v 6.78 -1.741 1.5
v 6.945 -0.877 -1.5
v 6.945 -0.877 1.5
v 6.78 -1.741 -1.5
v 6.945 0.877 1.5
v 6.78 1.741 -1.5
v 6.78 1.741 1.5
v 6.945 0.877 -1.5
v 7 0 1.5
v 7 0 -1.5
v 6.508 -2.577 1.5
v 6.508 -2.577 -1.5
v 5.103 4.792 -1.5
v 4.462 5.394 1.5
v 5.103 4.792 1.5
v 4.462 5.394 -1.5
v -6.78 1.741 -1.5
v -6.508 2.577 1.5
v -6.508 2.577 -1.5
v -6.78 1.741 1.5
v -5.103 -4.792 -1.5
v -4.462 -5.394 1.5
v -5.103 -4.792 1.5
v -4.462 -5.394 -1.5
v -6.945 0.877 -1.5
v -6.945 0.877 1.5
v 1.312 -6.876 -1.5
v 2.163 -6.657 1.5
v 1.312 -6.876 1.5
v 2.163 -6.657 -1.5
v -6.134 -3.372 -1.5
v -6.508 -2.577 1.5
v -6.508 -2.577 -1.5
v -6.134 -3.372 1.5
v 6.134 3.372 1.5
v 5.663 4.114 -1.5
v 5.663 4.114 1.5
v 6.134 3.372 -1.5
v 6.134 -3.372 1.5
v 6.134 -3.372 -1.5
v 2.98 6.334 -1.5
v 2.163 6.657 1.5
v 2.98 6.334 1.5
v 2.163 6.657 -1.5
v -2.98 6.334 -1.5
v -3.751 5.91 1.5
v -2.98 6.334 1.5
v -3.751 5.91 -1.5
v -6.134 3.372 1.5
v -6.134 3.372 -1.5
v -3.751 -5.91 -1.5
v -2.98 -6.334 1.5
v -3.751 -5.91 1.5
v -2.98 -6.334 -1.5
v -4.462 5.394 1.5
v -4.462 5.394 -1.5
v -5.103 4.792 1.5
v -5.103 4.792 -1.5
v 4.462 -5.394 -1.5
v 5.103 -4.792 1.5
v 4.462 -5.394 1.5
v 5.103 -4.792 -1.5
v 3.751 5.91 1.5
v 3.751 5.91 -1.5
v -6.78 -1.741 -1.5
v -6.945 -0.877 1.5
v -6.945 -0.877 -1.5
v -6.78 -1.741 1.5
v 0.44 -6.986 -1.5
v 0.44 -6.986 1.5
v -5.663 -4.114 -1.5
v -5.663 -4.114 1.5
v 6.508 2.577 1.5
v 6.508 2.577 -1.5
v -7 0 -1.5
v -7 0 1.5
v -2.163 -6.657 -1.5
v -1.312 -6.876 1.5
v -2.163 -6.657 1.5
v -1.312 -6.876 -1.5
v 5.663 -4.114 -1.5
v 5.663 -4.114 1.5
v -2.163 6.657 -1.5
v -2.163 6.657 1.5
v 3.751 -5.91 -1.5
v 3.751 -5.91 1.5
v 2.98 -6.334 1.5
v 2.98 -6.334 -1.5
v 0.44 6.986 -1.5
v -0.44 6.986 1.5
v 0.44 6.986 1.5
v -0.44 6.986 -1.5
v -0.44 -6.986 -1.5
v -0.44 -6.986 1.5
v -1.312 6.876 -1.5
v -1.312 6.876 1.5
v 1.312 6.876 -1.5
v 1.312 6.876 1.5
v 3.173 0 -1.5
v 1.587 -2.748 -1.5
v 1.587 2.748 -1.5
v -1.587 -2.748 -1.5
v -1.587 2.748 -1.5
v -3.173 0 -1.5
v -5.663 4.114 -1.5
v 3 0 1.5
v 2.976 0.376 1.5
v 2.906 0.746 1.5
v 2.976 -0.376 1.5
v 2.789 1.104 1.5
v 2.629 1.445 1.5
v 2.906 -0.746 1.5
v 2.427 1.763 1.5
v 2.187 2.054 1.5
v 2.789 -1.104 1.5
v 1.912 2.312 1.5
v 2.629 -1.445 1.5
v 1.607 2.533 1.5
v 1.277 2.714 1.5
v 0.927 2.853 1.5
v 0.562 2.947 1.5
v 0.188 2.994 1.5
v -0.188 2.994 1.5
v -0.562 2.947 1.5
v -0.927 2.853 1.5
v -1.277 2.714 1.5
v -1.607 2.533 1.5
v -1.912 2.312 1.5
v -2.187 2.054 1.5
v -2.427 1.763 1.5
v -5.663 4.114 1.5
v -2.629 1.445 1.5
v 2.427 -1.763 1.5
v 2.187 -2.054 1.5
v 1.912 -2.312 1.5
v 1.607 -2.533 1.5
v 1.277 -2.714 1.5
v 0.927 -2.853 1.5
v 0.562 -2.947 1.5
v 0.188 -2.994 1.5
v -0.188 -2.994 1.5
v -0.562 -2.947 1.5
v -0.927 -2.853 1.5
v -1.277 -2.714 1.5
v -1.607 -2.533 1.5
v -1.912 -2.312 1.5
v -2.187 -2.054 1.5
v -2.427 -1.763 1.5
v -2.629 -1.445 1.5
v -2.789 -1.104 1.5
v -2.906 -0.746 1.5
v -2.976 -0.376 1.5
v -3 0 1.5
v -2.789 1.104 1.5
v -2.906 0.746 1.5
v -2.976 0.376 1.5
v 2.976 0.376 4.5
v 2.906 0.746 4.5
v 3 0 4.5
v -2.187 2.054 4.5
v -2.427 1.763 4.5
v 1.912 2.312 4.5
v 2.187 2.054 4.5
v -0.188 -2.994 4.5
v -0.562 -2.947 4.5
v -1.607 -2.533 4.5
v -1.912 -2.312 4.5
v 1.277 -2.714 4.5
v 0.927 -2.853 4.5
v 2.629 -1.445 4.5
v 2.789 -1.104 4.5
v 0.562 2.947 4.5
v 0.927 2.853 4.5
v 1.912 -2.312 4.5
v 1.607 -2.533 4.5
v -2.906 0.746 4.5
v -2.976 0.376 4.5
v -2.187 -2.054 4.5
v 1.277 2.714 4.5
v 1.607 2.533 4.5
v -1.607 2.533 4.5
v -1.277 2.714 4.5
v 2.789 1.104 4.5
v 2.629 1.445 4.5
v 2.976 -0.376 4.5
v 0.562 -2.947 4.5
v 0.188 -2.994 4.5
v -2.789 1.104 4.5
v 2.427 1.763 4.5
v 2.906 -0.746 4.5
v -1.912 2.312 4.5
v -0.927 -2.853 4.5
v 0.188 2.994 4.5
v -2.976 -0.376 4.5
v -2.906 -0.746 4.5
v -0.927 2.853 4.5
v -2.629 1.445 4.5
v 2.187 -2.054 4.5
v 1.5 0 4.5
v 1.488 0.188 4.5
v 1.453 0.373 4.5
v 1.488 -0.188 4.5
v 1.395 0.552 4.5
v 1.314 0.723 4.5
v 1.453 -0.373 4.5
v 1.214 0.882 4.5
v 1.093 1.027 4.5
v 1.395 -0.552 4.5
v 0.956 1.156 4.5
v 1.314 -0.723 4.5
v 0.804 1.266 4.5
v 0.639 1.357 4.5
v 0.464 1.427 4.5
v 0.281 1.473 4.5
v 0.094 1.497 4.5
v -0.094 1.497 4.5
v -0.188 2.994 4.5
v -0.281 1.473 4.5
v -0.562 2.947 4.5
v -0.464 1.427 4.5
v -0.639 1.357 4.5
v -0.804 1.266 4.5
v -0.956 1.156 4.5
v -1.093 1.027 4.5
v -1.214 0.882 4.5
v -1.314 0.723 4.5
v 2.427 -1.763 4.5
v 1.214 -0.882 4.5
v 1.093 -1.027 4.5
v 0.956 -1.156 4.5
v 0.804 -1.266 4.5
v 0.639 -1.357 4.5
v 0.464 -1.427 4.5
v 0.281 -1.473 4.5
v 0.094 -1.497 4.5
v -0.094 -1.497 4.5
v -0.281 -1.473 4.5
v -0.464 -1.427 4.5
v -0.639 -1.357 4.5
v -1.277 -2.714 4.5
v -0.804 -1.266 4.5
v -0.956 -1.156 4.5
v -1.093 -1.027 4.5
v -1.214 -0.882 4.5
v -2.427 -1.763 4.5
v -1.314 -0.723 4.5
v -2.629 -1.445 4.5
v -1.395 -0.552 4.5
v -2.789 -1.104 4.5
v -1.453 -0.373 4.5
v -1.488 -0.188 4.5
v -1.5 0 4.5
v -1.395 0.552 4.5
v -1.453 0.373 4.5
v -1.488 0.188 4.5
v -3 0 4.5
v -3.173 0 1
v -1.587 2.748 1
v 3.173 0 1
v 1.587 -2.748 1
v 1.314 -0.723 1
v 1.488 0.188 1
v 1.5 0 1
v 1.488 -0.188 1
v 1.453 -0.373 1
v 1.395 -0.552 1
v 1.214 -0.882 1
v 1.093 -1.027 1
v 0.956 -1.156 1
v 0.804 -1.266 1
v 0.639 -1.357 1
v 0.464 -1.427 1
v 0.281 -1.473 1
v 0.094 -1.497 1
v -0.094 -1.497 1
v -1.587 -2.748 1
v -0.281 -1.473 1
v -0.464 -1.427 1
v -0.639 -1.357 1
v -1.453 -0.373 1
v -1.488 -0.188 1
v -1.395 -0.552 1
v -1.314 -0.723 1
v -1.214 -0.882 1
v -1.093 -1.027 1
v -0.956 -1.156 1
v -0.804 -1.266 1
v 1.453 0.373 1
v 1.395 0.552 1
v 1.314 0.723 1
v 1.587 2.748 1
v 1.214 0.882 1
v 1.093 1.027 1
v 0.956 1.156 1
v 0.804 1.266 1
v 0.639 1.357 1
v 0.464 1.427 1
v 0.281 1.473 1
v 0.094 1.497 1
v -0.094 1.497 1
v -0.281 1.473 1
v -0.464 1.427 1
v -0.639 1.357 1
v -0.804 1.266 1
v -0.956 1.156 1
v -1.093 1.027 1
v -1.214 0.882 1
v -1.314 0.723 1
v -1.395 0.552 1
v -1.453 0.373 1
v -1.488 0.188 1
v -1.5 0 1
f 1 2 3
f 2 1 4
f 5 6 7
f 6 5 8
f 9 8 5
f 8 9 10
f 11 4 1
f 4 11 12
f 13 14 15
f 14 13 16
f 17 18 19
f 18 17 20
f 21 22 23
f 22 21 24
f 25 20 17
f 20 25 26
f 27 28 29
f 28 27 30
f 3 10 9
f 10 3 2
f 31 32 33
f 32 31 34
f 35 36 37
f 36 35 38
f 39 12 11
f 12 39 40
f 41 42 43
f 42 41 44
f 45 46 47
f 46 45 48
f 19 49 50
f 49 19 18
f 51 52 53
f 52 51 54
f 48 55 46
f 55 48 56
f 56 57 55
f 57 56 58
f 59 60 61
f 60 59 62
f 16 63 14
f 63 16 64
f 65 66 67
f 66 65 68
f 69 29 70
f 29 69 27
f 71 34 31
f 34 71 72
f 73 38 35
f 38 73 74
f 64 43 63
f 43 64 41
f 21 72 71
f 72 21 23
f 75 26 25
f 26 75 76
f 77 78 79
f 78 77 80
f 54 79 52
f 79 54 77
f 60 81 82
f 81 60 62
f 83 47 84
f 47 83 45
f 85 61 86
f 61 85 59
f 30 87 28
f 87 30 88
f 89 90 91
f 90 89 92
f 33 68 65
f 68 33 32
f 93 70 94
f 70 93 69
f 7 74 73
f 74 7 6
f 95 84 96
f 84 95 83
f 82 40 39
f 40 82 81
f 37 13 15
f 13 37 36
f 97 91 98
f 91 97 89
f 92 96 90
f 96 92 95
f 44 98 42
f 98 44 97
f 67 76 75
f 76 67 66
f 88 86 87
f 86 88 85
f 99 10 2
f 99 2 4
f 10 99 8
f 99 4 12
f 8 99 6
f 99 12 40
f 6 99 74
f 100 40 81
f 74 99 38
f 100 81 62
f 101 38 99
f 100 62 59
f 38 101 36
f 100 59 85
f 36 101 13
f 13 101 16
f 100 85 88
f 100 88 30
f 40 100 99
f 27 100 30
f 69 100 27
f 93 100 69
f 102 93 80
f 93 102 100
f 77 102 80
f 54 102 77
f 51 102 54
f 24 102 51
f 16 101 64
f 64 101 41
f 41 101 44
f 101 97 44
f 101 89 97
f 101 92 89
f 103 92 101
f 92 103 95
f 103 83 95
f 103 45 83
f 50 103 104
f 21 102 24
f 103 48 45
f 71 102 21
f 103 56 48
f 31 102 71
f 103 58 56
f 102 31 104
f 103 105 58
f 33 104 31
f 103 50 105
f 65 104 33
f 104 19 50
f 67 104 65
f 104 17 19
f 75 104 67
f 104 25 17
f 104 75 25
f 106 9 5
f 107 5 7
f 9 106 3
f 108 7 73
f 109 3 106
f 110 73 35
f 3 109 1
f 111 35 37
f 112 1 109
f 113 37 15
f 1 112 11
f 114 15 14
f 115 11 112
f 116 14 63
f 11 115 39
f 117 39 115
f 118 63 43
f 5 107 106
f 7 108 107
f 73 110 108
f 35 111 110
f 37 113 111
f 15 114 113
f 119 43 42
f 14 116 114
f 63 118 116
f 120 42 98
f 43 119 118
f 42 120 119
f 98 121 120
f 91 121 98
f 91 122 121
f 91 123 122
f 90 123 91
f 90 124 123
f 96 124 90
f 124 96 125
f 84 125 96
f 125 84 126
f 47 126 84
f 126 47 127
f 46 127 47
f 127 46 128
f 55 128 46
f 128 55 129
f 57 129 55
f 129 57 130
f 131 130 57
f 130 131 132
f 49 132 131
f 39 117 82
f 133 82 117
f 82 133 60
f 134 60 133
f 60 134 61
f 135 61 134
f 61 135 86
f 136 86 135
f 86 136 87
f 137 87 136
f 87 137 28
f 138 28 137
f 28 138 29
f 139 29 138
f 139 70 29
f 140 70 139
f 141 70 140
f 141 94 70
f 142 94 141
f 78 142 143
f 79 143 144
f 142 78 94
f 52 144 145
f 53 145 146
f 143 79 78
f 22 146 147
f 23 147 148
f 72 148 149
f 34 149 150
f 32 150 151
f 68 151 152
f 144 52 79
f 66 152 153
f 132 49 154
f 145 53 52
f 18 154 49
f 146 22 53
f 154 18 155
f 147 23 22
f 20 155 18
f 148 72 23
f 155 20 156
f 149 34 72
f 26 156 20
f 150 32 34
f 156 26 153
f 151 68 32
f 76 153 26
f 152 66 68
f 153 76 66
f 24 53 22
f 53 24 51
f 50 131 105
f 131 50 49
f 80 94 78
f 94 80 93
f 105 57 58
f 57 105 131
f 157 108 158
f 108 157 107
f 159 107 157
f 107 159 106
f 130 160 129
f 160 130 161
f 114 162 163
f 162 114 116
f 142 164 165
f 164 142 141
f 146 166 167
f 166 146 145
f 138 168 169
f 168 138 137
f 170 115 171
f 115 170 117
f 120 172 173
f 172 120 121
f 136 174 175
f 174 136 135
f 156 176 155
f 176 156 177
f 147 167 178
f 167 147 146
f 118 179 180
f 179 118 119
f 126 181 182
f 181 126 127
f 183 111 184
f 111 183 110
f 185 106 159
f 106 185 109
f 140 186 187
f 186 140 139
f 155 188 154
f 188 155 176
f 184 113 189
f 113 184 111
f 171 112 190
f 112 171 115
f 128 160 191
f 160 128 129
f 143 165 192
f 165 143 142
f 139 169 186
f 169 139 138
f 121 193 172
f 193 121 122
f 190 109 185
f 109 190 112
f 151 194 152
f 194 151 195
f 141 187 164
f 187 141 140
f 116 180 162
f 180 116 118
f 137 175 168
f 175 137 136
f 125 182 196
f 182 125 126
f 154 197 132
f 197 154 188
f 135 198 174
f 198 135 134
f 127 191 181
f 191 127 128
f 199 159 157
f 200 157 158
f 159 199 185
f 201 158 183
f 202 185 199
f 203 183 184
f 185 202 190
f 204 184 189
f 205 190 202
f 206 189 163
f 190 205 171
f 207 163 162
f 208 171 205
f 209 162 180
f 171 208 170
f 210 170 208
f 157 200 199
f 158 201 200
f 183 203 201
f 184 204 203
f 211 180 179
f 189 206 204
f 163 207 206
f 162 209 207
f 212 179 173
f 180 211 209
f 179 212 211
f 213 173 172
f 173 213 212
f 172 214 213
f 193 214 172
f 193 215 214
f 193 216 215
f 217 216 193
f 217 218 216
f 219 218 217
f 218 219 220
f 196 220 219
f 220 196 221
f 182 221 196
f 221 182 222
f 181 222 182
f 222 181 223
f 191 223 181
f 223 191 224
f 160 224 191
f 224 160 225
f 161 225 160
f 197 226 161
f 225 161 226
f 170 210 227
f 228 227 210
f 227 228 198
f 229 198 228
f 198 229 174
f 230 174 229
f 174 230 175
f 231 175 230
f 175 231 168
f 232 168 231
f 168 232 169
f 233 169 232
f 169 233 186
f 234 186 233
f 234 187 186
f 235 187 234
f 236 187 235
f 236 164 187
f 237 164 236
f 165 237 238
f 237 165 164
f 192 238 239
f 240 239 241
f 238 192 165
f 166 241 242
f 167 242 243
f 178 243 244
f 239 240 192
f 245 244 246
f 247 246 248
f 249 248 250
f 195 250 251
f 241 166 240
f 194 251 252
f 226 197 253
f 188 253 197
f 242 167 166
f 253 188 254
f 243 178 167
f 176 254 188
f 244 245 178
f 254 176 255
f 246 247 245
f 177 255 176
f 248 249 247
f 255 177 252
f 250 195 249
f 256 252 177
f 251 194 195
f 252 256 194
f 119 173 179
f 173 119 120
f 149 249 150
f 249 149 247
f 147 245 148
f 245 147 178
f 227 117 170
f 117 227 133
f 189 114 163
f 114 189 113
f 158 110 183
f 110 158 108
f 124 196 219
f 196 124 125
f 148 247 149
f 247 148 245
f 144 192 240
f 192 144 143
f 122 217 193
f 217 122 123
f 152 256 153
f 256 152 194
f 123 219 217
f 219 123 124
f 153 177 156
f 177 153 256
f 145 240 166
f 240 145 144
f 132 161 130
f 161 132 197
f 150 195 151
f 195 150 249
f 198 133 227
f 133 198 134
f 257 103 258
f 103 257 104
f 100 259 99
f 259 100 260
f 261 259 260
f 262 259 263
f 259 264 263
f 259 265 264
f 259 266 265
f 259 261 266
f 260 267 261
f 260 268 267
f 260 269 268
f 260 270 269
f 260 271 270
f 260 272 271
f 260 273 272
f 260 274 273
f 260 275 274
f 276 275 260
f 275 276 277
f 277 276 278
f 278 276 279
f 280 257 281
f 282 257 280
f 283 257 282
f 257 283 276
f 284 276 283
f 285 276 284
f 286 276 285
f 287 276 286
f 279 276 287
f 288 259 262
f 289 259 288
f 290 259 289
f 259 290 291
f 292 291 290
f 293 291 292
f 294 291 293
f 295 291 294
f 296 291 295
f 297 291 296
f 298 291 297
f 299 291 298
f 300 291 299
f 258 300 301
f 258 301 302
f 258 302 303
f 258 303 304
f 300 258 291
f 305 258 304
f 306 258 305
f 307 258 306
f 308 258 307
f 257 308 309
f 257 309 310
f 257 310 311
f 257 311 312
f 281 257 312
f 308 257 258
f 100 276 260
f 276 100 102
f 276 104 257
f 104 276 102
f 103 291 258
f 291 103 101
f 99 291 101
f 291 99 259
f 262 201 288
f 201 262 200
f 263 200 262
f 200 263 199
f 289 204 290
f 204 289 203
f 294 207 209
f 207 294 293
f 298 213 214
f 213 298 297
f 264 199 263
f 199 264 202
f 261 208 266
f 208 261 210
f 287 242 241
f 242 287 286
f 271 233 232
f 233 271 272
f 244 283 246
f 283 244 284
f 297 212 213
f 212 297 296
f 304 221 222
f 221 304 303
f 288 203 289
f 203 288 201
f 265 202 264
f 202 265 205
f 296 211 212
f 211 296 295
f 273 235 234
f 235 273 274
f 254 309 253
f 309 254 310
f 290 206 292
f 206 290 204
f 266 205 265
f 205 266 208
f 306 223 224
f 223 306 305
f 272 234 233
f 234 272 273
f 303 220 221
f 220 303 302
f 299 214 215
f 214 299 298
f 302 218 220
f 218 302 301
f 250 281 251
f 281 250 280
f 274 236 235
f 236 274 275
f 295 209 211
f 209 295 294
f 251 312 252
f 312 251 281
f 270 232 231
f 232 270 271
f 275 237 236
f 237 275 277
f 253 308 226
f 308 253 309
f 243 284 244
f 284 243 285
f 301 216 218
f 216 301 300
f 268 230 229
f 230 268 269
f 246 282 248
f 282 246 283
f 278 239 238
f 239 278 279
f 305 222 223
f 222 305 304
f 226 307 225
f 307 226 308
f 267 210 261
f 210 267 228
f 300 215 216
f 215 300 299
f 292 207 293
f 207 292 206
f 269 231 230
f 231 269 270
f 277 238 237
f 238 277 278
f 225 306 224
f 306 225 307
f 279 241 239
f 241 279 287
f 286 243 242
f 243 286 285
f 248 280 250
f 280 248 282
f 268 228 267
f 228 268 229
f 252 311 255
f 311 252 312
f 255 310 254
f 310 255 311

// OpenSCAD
$fn = 50;


difference() {
	union() {
		translate(v = [0, 0, -1.5000000000]) {
			cylinder(h = 3, r = 7.0000000000);
		}
		translate(v = [0, 0, -1.5000000000]) {
			cylinder(h = 6, r = 3.0000000000);
		}
	}
	union() {
		translate(v = [0, 0, -1.5000000000]) {
			rotate(a = [0, 0, 0]) {
				difference() {
					union() {
						linear_extrude(height = 2.5000000000) {
							polygon(points = [[3.1735000000, 0.0000000000], [1.5867500000, 2.7483316189], [-1.5867500000, 2.7483316189], [-3.1735000000, 0.0000000000], [-1.5867500000, -2.7483316189], [1.5867500000, -2.7483316189]]);
						}
					}
					union();
				}
			}
		}
		translate(v = [0, 0, -100.0000000000]) {
			cylinder(h = 200, r = 1.5000000000);
		}
	}
}
